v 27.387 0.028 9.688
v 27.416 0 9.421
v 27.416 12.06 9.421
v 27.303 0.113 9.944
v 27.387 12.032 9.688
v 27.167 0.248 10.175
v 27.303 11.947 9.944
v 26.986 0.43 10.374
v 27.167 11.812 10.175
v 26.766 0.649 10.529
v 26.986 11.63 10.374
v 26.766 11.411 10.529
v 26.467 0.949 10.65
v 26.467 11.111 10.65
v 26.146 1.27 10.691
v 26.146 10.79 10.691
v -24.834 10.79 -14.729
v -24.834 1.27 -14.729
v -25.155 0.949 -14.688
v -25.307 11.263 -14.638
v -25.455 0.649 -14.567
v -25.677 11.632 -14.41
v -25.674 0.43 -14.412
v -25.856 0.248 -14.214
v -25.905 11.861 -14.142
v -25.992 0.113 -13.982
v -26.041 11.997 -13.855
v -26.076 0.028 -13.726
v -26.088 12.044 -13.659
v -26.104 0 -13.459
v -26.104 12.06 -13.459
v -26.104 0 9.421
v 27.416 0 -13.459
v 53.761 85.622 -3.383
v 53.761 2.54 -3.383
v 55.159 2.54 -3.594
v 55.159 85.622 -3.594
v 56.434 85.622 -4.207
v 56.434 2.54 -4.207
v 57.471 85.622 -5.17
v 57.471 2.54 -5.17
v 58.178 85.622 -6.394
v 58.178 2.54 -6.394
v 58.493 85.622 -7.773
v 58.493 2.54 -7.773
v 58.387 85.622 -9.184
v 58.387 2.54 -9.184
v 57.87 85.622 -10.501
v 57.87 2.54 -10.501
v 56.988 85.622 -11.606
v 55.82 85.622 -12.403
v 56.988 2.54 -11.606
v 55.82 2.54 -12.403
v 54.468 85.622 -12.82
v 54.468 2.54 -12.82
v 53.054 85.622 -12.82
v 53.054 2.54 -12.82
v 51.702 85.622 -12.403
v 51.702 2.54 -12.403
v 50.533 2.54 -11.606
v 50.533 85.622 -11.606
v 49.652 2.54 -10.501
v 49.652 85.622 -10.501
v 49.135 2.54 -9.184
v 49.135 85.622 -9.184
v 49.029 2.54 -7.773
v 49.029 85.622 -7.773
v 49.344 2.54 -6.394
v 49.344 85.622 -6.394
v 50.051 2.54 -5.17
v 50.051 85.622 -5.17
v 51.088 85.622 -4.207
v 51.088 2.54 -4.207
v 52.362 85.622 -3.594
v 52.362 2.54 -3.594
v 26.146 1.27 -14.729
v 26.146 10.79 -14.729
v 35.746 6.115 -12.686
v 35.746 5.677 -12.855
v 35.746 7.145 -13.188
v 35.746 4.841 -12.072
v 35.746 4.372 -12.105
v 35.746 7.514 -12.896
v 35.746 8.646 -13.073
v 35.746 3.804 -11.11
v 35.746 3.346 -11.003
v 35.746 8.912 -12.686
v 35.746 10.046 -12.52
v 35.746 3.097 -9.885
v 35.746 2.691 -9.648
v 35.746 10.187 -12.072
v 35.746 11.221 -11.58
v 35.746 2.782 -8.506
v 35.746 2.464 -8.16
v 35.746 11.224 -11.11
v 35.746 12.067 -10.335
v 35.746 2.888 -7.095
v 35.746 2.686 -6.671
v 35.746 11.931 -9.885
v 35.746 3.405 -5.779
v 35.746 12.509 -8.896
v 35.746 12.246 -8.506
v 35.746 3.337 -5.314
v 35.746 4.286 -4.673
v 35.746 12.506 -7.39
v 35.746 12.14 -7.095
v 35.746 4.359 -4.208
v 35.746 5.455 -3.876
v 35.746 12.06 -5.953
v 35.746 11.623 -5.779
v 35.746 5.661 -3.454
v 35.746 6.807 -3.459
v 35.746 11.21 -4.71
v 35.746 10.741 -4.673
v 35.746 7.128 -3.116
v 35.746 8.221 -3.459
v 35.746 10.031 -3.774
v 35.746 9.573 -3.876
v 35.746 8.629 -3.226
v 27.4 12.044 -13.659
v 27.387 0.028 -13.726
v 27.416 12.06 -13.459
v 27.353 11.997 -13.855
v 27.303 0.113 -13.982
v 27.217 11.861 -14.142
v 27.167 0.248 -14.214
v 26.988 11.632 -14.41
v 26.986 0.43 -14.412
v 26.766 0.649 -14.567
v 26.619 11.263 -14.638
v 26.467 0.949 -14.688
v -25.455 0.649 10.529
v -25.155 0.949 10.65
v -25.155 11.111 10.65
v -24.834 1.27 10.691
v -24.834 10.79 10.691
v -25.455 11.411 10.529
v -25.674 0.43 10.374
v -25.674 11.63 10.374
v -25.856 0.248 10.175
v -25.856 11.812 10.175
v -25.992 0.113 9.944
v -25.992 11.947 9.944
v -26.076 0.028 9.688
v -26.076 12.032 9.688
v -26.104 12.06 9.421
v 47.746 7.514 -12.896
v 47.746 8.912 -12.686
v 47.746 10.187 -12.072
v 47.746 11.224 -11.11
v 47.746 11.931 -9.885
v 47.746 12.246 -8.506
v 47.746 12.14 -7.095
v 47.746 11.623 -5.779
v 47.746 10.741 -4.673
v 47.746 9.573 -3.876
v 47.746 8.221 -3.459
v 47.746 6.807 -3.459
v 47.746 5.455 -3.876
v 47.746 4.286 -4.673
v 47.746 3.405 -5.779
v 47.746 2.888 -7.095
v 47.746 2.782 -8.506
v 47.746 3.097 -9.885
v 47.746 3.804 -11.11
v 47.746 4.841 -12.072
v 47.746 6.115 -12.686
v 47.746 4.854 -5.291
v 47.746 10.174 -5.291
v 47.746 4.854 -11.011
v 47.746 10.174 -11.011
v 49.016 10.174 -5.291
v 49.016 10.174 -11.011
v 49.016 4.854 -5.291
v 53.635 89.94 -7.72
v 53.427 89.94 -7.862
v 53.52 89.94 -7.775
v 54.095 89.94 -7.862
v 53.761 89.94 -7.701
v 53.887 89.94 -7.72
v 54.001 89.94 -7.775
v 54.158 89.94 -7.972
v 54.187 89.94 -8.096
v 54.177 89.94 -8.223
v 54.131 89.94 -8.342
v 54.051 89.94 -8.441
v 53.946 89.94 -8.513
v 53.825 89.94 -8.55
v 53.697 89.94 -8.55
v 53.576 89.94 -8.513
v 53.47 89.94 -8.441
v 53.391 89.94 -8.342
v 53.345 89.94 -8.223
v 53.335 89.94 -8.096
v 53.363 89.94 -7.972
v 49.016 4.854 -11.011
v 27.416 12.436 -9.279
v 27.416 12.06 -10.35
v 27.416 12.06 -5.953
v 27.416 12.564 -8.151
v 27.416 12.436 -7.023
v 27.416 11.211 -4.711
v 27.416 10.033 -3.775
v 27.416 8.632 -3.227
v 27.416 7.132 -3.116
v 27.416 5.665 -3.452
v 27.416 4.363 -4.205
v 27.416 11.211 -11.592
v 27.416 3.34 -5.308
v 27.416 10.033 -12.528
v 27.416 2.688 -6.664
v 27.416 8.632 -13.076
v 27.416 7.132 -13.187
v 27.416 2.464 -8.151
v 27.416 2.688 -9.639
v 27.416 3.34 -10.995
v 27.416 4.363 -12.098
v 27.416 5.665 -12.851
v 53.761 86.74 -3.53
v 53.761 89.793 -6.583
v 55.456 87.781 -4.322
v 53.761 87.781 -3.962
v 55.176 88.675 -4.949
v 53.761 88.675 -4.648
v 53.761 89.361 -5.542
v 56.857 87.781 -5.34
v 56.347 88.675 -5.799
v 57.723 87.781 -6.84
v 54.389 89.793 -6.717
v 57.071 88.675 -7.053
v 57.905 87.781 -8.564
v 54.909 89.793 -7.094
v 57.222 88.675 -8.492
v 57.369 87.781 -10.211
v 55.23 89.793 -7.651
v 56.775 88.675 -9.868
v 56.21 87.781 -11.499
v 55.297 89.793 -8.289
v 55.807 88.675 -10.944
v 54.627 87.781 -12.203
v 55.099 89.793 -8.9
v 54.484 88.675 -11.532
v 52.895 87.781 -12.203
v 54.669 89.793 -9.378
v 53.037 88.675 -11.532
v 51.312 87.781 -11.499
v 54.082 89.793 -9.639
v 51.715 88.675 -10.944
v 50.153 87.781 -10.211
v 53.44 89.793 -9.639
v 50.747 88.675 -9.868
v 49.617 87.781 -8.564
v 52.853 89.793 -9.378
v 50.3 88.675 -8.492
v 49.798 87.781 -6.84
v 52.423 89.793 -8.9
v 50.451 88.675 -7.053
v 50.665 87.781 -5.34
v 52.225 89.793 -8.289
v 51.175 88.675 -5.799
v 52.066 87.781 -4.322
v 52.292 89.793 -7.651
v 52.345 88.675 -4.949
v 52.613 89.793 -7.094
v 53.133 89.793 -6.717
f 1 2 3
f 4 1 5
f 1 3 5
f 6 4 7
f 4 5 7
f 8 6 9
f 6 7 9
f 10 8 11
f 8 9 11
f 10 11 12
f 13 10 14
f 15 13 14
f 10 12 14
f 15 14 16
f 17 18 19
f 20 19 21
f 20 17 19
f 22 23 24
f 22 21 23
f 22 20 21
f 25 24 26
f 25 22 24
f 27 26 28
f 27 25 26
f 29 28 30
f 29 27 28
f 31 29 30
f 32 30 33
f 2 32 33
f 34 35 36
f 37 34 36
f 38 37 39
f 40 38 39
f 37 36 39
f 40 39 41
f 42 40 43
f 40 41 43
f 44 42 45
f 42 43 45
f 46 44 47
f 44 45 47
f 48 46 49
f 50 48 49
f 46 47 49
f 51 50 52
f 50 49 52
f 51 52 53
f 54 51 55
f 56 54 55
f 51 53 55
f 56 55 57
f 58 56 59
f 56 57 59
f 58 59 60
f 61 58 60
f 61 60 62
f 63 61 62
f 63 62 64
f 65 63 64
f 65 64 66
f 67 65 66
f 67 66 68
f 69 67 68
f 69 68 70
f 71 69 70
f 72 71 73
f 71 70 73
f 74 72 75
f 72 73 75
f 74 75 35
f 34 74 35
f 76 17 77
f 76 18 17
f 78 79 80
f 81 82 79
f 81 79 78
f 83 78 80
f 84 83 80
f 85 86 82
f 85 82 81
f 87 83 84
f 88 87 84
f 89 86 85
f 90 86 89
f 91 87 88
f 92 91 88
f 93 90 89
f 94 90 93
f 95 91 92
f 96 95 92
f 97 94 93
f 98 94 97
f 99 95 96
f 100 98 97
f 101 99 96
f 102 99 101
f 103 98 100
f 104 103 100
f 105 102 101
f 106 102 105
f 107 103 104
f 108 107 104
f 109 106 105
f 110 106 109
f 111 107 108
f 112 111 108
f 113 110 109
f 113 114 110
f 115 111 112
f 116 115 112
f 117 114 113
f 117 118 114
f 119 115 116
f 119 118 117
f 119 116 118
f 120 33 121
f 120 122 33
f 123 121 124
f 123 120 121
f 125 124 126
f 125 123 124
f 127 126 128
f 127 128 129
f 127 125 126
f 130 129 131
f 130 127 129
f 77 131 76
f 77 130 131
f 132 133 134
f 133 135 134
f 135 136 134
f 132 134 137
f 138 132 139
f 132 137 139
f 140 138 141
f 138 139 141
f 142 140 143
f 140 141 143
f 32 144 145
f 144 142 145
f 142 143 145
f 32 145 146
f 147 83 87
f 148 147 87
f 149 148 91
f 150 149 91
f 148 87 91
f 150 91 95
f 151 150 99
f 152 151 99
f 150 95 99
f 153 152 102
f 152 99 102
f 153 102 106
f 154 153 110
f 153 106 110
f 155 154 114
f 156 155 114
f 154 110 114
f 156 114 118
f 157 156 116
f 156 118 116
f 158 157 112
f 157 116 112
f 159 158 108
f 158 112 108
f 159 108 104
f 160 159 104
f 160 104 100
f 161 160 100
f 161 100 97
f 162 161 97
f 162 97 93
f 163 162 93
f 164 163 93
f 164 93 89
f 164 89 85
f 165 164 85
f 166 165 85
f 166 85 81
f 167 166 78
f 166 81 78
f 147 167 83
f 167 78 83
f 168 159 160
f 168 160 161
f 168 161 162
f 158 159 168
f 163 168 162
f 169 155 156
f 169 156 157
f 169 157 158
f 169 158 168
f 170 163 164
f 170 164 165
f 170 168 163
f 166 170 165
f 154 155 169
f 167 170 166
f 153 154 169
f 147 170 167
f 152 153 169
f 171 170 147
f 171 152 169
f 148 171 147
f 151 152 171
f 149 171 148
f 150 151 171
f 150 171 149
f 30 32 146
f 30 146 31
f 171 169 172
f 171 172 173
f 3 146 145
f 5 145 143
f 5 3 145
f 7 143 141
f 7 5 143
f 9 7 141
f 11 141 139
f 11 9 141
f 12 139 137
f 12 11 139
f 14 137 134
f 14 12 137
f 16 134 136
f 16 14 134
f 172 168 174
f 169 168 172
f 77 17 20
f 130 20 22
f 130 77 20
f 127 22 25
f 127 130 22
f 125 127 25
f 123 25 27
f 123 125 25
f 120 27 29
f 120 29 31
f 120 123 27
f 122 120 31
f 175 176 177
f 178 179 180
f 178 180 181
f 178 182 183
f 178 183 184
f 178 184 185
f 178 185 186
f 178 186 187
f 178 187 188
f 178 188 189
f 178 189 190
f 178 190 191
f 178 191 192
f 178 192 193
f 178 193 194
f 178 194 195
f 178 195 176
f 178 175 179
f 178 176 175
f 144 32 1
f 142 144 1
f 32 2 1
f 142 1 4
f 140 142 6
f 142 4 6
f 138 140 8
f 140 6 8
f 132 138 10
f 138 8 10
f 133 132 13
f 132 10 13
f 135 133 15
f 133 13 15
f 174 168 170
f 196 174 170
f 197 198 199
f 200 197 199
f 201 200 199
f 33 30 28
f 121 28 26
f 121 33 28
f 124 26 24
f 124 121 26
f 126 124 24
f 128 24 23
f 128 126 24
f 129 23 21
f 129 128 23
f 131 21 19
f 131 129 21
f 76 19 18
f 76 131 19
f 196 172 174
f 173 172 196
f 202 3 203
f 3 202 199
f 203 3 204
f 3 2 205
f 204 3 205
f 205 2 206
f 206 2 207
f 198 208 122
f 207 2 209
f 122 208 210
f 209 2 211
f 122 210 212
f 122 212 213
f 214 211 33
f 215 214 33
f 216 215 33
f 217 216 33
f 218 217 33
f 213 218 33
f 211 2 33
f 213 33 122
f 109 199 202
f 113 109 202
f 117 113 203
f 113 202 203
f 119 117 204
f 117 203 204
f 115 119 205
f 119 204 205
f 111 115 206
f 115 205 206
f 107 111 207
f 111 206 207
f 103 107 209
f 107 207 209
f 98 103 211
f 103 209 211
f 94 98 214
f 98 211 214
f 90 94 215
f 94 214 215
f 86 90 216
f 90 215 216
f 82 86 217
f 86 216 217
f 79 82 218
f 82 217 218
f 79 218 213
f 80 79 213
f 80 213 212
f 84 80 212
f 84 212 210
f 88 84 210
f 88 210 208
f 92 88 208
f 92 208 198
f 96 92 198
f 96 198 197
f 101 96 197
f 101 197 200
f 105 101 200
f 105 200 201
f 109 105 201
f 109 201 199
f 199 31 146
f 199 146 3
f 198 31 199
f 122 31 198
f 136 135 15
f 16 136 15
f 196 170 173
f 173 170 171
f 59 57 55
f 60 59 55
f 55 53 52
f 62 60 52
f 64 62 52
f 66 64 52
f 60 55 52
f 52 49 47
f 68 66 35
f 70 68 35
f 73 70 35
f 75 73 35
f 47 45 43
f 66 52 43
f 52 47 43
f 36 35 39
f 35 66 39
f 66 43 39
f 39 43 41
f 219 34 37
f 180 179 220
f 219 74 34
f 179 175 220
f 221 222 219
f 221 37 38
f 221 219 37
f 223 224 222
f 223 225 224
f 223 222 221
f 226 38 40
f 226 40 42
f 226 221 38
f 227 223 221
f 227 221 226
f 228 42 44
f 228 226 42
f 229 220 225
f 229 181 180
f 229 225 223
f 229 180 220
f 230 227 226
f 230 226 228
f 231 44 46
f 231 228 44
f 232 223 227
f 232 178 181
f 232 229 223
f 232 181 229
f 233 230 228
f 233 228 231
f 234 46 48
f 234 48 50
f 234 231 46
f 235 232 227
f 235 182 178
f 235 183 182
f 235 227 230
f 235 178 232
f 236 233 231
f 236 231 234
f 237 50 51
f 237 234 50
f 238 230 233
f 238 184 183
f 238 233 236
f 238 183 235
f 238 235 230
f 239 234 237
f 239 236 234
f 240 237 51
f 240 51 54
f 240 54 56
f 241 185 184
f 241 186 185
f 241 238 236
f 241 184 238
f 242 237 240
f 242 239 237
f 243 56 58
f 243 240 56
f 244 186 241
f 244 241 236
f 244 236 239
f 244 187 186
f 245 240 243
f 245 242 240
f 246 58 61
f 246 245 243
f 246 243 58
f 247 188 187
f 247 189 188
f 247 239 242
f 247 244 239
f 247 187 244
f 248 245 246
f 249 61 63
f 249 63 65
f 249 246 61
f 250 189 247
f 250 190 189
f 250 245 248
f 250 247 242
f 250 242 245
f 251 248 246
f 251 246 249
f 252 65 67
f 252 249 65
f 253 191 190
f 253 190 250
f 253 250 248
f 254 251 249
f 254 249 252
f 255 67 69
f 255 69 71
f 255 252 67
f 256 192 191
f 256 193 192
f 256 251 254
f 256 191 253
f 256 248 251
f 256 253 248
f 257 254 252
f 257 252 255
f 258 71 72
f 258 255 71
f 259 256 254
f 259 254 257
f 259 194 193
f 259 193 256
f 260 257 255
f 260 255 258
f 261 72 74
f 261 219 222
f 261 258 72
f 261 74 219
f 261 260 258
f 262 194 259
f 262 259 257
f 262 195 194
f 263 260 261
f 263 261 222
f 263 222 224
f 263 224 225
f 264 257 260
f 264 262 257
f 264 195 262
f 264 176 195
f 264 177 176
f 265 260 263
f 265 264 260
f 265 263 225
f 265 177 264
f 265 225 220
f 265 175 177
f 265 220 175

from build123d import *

# Parameters (mm, degrees)
SKETCH1_W           = 53.52
SKETCH1_H           = 25.42
BOSS_EXTRUDE2_DEPTH = 12.06
SKETCH2_R           = 5.05
BOSS_EXTRUDE3_DEPTH = 8.33
FILLET2_R           = 1.27
FILLET3_R           = 1.27
SKETCH3_R           = 4.745
BOSS_EXTRUDE4_DEPTH = 12
SKETCH10_R          = 4.745000035
BOSS_EXTRUDE8_DEPTH = 87.4
FILLET4_R           = 4.318
SKETCH4_W           = 5.72
SKETCH4_H           = 5.32
BOSS_EXTRUDE9_DEPTH = 1.27


with BuildPart() as part:
    # Sketch1 → Boss-Extrude2 (new body)
    with BuildSketch(Plane(origin=(0, 0, 0), x_dir=(1, 0, 0), z_dir=(0, 1, 0))):
        with Locations((0.655882353, 2.019117647)):
            Rectangle(SKETCH1_W, SKETCH1_H)
    extrude(amount=BOSS_EXTRUDE2_DEPTH)

    # Sketch2 → Boss-Extrude3 (add)
    with BuildSketch(Plane(origin=(27.415882353, 0, 0), x_dir=(0, 0, -1), z_dir=(1, 0, 0))):
        with Locations(Location((8.151317647, 7.5138, 0), (0, 0, 115.810680581))):
            Circle(SKETCH2_R)
    extrude(amount=BOSS_EXTRUDE3_DEPTH)

    # Fillet2
    fillet2_edges = [part.edges().sort_by_distance(p)[0] for p in [
        (0.655882353, 0, 10.690882353),
        (0.655882353, 12.06, 10.690882353),
        (27.415882353, 6.03, 10.690882353),
        (-26.104117647, 6.03, 10.690882353),
    ]]
    fillet(fillet2_edges, radius=FILLET2_R)

    # Fillet3
    fillet3_edges = [part.edges().sort_by_distance(p)[0] for p in [
        (0.655882353, 12.06, -14.729117647),
        (0.655882353, 0, -14.729117647),
        (-26.104117647, 6.03, -14.729117647),
        (27.415882353, 6.03, -14.729117647),
    ]]
    fillet(fillet3_edges, radius=FILLET3_R)

    # Sketch3 → Boss-Extrude4 (add)
    with BuildSketch(Plane(origin=(35.745882353, 0, 0), x_dir=(0, 0, -1), z_dir=(1, 0, 0))):
        with Locations((8.151317647, 7.5138)):
            Circle(SKETCH3_R)
    extrude(amount=BOSS_EXTRUDE4_DEPTH)

    # Sketch4 → Boss-Extrude9 (add)
    with BuildSketch(Plane(origin=(47.745882353, 0, 0), x_dir=(0, 0, -1), z_dir=(1, 0, 0))):
        with Locations((8.151317647, 7.5138)):
            Rectangle(SKETCH4_W, SKETCH4_H)
    extrude(amount=BOSS_EXTRUDE9_DEPTH)


with BuildPart() as body_2:
    # Sketch10 → Boss-Extrude8 (new body)
    with BuildSketch(Plane(origin=(0, 2.54, 0), x_dir=(1, 0, 0), z_dir=(0, 1, 0))):
        with Locations(Location((53.760882261, 8.128, 0), (0, 0, 270))):
            Circle(SKETCH10_R)
    extrude(amount=BOSS_EXTRUDE8_DEPTH)

    # Fillet4
    fillet4_edges = [body_2.edges().sort_by_distance(p)[0] for p in [
        (53.760882261, 89.94, -12.873000035),
    ]]
    fillet(fillet4_edges, radius=FILLET4_R)


solid = Compound([part.part, body_2.part])
